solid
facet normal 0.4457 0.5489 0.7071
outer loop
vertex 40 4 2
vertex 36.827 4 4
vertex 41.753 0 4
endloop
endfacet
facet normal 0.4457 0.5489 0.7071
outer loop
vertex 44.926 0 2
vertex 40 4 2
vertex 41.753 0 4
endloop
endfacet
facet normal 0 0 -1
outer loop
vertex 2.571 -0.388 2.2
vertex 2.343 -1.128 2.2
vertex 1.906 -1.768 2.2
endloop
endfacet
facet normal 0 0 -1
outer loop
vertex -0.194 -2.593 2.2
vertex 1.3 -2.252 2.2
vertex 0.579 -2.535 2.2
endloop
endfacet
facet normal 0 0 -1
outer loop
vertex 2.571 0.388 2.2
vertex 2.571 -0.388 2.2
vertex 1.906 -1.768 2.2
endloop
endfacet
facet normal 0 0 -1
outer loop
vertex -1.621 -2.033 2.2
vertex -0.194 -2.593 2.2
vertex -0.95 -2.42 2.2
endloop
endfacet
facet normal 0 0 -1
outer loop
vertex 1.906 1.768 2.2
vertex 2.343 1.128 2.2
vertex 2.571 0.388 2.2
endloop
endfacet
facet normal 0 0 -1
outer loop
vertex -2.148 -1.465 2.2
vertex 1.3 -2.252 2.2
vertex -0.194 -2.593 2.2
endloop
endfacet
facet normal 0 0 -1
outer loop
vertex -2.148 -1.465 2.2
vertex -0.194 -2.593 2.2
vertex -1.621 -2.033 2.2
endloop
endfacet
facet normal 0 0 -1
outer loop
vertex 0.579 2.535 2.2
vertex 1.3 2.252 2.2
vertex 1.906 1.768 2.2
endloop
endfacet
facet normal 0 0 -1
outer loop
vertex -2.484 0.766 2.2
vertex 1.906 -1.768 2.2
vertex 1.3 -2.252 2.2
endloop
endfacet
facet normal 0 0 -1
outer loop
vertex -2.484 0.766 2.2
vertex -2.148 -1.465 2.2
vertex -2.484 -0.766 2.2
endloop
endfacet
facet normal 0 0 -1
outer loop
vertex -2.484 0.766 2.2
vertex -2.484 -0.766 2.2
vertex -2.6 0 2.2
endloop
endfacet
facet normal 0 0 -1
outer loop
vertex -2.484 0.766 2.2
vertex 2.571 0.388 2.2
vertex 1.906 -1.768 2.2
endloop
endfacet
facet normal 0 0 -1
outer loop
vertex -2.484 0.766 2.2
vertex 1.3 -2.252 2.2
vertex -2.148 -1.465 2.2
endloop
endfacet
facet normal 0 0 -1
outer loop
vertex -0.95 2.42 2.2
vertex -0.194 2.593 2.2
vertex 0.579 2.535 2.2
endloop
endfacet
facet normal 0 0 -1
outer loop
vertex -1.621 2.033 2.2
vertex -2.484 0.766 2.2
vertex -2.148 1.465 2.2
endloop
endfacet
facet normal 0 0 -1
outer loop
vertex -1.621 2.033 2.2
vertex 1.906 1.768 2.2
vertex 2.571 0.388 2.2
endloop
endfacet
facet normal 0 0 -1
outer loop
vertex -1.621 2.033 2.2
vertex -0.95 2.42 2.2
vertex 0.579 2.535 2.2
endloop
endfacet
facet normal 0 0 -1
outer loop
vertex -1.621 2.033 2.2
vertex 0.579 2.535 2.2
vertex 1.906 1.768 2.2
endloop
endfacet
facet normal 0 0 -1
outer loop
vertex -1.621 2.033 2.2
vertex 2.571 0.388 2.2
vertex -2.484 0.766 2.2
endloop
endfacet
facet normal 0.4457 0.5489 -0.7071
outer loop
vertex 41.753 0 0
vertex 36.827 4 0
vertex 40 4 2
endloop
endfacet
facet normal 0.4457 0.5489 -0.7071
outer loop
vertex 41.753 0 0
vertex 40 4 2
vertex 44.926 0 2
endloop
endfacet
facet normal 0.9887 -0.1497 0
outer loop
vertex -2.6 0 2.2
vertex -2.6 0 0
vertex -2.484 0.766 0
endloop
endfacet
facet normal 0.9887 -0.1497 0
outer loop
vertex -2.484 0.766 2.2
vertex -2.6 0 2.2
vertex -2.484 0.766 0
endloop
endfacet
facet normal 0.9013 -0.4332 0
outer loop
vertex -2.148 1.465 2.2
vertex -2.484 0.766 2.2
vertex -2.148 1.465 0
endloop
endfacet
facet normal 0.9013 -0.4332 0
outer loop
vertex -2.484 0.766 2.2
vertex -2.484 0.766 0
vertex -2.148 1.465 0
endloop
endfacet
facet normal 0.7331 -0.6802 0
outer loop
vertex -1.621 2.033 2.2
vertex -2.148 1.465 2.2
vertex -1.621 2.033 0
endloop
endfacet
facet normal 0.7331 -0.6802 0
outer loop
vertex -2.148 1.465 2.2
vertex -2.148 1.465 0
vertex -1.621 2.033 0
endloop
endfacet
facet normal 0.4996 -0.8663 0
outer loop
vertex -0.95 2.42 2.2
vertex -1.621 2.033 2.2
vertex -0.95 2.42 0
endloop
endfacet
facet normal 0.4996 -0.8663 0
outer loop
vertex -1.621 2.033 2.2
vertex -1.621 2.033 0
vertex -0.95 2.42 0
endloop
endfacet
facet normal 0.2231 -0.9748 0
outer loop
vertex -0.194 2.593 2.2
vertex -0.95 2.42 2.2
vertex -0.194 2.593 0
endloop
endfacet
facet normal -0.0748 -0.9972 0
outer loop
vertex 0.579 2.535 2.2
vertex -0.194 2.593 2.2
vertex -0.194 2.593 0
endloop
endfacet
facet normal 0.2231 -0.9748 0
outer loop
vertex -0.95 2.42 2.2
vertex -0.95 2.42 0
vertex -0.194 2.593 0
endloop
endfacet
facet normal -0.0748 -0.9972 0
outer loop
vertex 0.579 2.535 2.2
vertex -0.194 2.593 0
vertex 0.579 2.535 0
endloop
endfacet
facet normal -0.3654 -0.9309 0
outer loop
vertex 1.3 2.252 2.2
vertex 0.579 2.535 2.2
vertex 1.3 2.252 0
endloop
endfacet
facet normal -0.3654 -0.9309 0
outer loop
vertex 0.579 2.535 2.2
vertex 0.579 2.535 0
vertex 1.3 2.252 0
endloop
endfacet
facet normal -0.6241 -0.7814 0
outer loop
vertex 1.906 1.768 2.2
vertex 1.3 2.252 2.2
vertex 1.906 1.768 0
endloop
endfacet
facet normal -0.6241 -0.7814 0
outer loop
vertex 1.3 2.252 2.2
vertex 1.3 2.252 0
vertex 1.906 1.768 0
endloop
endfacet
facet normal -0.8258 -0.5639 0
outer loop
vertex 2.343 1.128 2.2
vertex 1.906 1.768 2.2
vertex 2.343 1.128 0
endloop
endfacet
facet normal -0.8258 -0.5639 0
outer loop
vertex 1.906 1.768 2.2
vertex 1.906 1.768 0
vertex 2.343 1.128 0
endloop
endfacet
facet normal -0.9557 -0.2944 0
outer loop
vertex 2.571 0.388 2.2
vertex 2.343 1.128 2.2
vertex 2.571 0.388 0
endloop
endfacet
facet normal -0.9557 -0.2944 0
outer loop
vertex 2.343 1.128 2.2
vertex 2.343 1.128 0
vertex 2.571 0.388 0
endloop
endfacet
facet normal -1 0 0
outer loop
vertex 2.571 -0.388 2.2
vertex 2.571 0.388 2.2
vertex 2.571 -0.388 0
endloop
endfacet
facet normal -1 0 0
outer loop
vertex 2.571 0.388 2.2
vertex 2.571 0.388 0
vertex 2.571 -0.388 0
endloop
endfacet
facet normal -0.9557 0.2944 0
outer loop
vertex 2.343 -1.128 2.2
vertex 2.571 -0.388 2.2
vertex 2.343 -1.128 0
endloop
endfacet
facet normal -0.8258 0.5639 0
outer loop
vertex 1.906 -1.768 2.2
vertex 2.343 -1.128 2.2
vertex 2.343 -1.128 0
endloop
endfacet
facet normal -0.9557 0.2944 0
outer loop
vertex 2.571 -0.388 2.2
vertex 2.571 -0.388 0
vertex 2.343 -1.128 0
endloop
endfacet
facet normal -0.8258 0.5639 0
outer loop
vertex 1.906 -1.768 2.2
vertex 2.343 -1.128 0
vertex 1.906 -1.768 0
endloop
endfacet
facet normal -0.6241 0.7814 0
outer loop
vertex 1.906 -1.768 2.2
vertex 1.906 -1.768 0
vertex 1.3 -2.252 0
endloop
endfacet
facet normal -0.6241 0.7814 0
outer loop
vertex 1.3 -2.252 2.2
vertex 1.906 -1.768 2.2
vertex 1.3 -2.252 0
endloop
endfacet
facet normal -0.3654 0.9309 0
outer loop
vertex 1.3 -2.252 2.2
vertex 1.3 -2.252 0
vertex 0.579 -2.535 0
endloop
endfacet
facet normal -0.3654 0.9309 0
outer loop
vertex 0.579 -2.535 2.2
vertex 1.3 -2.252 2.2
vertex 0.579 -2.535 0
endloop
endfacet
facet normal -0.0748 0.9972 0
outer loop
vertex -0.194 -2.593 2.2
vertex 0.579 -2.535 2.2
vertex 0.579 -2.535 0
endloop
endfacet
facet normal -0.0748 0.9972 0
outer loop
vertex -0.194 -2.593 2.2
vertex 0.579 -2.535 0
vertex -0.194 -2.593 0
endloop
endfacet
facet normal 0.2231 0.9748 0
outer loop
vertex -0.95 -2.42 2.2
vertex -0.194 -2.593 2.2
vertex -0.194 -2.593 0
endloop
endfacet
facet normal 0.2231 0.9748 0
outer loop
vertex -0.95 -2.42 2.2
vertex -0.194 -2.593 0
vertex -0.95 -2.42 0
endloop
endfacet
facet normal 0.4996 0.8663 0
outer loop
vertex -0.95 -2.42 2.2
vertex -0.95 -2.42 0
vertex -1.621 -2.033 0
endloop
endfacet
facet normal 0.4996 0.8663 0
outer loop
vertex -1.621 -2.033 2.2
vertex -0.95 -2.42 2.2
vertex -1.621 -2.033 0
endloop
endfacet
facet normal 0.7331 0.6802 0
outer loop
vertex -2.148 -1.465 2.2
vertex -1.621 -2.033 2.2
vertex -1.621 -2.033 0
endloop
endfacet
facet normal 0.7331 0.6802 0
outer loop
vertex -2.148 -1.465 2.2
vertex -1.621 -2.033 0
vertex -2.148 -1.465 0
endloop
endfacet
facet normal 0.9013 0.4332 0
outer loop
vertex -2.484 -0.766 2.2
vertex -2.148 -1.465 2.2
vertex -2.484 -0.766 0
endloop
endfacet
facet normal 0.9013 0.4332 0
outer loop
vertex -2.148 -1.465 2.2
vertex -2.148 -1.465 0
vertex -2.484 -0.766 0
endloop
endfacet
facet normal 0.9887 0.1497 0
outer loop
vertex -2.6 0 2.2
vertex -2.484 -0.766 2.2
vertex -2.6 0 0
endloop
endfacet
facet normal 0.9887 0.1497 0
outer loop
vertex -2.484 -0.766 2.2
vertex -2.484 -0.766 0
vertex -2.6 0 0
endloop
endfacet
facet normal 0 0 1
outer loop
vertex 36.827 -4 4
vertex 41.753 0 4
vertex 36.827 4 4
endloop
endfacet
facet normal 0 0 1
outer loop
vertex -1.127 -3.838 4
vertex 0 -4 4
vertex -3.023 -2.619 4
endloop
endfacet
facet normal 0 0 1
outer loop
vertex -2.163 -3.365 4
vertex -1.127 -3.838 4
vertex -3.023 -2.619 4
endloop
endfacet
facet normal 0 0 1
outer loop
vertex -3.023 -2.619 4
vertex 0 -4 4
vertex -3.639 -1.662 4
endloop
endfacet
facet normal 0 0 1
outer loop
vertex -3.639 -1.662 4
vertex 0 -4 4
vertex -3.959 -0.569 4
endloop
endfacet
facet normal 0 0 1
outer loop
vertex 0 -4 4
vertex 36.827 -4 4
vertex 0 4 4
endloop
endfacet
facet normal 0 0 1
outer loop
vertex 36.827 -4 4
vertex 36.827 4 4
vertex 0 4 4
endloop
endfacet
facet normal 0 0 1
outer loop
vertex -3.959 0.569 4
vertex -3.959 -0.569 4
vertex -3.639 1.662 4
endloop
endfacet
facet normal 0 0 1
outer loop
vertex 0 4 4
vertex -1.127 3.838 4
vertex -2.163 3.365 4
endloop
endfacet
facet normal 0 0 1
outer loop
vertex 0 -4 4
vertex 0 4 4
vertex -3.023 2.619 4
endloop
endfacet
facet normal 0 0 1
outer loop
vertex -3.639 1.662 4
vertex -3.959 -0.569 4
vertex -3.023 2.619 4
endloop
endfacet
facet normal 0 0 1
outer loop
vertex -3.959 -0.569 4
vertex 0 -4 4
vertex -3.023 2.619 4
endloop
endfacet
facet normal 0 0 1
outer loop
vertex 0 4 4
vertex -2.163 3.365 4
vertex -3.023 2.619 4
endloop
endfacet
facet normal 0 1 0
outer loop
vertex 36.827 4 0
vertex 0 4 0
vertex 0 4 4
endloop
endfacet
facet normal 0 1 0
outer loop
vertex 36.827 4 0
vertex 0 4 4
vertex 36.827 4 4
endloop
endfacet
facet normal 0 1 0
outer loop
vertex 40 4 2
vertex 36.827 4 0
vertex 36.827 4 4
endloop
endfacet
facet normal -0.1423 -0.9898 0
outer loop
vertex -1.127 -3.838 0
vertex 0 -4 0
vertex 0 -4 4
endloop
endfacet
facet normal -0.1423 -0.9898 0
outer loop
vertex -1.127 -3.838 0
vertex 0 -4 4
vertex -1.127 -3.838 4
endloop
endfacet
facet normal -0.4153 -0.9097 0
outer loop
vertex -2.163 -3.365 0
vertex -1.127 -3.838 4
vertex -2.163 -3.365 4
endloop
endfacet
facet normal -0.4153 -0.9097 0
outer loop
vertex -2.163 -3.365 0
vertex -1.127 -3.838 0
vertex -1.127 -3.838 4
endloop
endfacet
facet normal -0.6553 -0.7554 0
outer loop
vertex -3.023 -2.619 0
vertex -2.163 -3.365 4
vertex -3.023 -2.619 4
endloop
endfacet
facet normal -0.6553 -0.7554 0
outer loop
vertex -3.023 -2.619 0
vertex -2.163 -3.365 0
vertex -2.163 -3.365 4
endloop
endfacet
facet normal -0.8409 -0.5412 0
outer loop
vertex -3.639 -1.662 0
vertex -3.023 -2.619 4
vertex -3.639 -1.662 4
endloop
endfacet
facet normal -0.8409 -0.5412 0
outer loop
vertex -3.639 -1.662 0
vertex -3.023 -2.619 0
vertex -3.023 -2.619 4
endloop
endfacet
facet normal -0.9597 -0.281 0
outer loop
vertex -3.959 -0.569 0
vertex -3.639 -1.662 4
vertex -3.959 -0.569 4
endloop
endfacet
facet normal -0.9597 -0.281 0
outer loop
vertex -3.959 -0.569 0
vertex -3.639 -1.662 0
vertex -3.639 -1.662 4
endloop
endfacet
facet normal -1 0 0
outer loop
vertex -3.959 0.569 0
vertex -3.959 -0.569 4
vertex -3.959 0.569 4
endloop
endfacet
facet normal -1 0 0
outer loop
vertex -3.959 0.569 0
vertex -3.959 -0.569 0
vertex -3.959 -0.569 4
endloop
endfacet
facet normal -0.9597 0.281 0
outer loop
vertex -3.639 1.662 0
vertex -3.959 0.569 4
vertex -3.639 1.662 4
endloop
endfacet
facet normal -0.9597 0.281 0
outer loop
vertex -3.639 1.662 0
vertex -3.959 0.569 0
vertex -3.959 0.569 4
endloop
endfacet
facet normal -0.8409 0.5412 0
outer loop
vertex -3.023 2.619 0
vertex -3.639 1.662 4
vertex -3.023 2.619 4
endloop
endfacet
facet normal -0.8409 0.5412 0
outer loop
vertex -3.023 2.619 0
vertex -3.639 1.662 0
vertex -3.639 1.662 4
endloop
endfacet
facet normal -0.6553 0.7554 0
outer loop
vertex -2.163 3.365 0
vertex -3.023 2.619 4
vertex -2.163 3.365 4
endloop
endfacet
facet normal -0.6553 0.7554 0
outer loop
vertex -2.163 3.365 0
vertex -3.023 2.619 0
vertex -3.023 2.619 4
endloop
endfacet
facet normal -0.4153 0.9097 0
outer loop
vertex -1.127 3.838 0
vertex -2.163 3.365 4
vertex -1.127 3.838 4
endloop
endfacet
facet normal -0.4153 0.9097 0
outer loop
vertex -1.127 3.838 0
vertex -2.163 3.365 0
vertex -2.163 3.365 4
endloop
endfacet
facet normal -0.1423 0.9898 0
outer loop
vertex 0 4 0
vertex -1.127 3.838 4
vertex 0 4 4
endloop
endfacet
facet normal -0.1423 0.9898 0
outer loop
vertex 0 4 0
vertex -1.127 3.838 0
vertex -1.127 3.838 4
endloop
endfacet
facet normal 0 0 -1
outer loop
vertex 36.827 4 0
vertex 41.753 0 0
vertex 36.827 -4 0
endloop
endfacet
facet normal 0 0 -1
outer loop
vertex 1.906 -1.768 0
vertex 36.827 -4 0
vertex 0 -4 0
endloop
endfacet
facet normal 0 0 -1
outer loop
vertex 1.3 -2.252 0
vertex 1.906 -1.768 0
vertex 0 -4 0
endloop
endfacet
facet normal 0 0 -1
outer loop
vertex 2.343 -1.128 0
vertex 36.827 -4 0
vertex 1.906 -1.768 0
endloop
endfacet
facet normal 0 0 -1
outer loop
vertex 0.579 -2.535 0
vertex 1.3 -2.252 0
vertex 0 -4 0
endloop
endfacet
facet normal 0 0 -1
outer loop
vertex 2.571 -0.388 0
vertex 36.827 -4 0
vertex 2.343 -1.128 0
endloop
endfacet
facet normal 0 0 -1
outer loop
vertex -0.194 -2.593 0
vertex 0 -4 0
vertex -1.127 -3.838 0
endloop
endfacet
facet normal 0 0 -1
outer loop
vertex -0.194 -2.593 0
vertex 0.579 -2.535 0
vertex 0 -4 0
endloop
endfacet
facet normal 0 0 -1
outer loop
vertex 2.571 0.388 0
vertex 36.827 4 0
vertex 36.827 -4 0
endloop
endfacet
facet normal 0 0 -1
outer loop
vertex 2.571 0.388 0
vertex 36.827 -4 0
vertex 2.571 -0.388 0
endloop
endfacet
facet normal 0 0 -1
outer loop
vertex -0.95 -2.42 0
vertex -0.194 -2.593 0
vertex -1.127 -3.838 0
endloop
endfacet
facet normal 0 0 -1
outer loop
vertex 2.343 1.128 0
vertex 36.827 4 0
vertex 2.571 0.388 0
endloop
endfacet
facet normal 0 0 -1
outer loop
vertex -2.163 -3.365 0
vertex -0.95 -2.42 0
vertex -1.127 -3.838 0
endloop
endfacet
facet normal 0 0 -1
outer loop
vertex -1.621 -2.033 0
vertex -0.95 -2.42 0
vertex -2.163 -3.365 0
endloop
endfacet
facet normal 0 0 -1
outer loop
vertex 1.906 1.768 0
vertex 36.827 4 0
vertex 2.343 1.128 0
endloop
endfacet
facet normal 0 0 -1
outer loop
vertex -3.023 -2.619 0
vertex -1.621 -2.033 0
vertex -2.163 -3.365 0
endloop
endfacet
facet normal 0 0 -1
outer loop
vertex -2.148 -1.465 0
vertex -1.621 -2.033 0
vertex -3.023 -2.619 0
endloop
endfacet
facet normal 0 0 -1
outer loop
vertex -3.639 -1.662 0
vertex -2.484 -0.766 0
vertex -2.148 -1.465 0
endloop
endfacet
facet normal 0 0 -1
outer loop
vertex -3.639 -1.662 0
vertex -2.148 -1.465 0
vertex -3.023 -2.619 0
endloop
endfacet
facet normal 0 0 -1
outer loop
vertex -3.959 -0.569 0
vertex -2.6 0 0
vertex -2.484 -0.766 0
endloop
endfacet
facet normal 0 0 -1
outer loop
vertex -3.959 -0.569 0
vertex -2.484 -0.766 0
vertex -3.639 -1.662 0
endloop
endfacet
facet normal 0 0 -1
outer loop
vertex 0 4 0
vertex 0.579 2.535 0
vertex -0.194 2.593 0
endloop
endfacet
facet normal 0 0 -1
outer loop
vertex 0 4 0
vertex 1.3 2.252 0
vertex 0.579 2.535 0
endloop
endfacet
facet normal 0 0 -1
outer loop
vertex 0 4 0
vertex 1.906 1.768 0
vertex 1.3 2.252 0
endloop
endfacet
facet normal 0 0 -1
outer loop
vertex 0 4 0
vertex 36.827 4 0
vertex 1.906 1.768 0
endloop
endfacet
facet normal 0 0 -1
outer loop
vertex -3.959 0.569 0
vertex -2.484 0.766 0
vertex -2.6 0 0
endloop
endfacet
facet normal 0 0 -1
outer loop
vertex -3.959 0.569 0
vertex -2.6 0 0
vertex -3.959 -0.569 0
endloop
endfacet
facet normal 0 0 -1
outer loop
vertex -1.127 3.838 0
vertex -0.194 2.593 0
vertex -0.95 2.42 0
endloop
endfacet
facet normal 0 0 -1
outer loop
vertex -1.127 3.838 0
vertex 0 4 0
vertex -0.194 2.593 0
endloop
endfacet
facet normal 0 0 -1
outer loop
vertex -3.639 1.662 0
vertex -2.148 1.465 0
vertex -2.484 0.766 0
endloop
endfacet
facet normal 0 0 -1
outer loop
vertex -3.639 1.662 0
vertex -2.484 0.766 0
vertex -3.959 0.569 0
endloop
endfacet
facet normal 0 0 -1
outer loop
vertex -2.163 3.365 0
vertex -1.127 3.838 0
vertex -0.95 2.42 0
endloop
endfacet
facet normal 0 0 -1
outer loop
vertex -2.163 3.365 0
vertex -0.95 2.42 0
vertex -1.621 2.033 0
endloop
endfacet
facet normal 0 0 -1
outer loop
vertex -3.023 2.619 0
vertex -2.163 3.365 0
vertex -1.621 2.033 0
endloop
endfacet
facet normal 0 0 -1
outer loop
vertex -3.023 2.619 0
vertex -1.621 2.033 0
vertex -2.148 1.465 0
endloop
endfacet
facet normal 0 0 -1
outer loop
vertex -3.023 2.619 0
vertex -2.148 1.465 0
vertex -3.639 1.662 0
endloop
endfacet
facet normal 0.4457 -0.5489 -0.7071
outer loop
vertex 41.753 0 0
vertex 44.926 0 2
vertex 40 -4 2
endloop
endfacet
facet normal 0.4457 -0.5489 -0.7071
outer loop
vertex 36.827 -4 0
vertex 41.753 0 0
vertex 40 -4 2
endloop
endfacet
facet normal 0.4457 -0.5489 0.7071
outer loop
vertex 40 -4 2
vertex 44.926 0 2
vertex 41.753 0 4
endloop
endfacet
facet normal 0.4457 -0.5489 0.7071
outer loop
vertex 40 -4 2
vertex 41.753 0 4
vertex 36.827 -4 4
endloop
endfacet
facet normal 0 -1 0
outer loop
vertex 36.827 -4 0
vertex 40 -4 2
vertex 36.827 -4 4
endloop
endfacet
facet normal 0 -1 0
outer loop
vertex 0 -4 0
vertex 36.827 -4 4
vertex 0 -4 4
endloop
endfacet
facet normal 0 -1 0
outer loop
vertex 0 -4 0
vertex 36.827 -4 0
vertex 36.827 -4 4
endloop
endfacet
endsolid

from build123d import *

# Parameters (mm, degrees)
EXTRUDE_1_DEPTH     = 4
SKETCH_2_R          = 2.6
CUT_EXTRUDE_1_DEPTH = 2.2
CHAMFER_2_SIZE      = 2


with BuildPart() as part:
    # 草图1 → 凸台-拉伸1 (new body)
    with BuildSketch(Plane.XY):
        with BuildLine():
            Line((0, 4), (40, 4))
            Line((40, 4), (44.926117642, 0))
            Line((44.926117642, 0), (40, -4))
            Line((40, -4), (0, -4))
            ThreePointArc((0, -4), (-4, 0), (0, 4))
        make_face()
    extrude(amount=EXTRUDE_1_DEPTH)

    # 草图2 → 切除-拉伸1 (cut)
    with BuildSketch(Plane(origin=(0, 0, 0), x_dir=(-1, 0, 0), z_dir=(0, 0, -1))):
        Circle(SKETCH_2_R)
    extrude(amount=-CUT_EXTRUDE_1_DEPTH, mode=Mode.SUBTRACT)

    # 倒角2
    chamfer_2_edges = [part.edges().sort_by_distance(p)[0] for p in [
        (42.463058821, -2, 0),
        (42.463058821, 2, 0),
        (42.463058821, -2, 4),
        (42.463058821, 2, 4),
    ]]
    chamfer(chamfer_2_edges, length=CHAMFER_2_SIZE - 0.0001)  # a hair under: the kernel refuses the full size


solid = part.part
